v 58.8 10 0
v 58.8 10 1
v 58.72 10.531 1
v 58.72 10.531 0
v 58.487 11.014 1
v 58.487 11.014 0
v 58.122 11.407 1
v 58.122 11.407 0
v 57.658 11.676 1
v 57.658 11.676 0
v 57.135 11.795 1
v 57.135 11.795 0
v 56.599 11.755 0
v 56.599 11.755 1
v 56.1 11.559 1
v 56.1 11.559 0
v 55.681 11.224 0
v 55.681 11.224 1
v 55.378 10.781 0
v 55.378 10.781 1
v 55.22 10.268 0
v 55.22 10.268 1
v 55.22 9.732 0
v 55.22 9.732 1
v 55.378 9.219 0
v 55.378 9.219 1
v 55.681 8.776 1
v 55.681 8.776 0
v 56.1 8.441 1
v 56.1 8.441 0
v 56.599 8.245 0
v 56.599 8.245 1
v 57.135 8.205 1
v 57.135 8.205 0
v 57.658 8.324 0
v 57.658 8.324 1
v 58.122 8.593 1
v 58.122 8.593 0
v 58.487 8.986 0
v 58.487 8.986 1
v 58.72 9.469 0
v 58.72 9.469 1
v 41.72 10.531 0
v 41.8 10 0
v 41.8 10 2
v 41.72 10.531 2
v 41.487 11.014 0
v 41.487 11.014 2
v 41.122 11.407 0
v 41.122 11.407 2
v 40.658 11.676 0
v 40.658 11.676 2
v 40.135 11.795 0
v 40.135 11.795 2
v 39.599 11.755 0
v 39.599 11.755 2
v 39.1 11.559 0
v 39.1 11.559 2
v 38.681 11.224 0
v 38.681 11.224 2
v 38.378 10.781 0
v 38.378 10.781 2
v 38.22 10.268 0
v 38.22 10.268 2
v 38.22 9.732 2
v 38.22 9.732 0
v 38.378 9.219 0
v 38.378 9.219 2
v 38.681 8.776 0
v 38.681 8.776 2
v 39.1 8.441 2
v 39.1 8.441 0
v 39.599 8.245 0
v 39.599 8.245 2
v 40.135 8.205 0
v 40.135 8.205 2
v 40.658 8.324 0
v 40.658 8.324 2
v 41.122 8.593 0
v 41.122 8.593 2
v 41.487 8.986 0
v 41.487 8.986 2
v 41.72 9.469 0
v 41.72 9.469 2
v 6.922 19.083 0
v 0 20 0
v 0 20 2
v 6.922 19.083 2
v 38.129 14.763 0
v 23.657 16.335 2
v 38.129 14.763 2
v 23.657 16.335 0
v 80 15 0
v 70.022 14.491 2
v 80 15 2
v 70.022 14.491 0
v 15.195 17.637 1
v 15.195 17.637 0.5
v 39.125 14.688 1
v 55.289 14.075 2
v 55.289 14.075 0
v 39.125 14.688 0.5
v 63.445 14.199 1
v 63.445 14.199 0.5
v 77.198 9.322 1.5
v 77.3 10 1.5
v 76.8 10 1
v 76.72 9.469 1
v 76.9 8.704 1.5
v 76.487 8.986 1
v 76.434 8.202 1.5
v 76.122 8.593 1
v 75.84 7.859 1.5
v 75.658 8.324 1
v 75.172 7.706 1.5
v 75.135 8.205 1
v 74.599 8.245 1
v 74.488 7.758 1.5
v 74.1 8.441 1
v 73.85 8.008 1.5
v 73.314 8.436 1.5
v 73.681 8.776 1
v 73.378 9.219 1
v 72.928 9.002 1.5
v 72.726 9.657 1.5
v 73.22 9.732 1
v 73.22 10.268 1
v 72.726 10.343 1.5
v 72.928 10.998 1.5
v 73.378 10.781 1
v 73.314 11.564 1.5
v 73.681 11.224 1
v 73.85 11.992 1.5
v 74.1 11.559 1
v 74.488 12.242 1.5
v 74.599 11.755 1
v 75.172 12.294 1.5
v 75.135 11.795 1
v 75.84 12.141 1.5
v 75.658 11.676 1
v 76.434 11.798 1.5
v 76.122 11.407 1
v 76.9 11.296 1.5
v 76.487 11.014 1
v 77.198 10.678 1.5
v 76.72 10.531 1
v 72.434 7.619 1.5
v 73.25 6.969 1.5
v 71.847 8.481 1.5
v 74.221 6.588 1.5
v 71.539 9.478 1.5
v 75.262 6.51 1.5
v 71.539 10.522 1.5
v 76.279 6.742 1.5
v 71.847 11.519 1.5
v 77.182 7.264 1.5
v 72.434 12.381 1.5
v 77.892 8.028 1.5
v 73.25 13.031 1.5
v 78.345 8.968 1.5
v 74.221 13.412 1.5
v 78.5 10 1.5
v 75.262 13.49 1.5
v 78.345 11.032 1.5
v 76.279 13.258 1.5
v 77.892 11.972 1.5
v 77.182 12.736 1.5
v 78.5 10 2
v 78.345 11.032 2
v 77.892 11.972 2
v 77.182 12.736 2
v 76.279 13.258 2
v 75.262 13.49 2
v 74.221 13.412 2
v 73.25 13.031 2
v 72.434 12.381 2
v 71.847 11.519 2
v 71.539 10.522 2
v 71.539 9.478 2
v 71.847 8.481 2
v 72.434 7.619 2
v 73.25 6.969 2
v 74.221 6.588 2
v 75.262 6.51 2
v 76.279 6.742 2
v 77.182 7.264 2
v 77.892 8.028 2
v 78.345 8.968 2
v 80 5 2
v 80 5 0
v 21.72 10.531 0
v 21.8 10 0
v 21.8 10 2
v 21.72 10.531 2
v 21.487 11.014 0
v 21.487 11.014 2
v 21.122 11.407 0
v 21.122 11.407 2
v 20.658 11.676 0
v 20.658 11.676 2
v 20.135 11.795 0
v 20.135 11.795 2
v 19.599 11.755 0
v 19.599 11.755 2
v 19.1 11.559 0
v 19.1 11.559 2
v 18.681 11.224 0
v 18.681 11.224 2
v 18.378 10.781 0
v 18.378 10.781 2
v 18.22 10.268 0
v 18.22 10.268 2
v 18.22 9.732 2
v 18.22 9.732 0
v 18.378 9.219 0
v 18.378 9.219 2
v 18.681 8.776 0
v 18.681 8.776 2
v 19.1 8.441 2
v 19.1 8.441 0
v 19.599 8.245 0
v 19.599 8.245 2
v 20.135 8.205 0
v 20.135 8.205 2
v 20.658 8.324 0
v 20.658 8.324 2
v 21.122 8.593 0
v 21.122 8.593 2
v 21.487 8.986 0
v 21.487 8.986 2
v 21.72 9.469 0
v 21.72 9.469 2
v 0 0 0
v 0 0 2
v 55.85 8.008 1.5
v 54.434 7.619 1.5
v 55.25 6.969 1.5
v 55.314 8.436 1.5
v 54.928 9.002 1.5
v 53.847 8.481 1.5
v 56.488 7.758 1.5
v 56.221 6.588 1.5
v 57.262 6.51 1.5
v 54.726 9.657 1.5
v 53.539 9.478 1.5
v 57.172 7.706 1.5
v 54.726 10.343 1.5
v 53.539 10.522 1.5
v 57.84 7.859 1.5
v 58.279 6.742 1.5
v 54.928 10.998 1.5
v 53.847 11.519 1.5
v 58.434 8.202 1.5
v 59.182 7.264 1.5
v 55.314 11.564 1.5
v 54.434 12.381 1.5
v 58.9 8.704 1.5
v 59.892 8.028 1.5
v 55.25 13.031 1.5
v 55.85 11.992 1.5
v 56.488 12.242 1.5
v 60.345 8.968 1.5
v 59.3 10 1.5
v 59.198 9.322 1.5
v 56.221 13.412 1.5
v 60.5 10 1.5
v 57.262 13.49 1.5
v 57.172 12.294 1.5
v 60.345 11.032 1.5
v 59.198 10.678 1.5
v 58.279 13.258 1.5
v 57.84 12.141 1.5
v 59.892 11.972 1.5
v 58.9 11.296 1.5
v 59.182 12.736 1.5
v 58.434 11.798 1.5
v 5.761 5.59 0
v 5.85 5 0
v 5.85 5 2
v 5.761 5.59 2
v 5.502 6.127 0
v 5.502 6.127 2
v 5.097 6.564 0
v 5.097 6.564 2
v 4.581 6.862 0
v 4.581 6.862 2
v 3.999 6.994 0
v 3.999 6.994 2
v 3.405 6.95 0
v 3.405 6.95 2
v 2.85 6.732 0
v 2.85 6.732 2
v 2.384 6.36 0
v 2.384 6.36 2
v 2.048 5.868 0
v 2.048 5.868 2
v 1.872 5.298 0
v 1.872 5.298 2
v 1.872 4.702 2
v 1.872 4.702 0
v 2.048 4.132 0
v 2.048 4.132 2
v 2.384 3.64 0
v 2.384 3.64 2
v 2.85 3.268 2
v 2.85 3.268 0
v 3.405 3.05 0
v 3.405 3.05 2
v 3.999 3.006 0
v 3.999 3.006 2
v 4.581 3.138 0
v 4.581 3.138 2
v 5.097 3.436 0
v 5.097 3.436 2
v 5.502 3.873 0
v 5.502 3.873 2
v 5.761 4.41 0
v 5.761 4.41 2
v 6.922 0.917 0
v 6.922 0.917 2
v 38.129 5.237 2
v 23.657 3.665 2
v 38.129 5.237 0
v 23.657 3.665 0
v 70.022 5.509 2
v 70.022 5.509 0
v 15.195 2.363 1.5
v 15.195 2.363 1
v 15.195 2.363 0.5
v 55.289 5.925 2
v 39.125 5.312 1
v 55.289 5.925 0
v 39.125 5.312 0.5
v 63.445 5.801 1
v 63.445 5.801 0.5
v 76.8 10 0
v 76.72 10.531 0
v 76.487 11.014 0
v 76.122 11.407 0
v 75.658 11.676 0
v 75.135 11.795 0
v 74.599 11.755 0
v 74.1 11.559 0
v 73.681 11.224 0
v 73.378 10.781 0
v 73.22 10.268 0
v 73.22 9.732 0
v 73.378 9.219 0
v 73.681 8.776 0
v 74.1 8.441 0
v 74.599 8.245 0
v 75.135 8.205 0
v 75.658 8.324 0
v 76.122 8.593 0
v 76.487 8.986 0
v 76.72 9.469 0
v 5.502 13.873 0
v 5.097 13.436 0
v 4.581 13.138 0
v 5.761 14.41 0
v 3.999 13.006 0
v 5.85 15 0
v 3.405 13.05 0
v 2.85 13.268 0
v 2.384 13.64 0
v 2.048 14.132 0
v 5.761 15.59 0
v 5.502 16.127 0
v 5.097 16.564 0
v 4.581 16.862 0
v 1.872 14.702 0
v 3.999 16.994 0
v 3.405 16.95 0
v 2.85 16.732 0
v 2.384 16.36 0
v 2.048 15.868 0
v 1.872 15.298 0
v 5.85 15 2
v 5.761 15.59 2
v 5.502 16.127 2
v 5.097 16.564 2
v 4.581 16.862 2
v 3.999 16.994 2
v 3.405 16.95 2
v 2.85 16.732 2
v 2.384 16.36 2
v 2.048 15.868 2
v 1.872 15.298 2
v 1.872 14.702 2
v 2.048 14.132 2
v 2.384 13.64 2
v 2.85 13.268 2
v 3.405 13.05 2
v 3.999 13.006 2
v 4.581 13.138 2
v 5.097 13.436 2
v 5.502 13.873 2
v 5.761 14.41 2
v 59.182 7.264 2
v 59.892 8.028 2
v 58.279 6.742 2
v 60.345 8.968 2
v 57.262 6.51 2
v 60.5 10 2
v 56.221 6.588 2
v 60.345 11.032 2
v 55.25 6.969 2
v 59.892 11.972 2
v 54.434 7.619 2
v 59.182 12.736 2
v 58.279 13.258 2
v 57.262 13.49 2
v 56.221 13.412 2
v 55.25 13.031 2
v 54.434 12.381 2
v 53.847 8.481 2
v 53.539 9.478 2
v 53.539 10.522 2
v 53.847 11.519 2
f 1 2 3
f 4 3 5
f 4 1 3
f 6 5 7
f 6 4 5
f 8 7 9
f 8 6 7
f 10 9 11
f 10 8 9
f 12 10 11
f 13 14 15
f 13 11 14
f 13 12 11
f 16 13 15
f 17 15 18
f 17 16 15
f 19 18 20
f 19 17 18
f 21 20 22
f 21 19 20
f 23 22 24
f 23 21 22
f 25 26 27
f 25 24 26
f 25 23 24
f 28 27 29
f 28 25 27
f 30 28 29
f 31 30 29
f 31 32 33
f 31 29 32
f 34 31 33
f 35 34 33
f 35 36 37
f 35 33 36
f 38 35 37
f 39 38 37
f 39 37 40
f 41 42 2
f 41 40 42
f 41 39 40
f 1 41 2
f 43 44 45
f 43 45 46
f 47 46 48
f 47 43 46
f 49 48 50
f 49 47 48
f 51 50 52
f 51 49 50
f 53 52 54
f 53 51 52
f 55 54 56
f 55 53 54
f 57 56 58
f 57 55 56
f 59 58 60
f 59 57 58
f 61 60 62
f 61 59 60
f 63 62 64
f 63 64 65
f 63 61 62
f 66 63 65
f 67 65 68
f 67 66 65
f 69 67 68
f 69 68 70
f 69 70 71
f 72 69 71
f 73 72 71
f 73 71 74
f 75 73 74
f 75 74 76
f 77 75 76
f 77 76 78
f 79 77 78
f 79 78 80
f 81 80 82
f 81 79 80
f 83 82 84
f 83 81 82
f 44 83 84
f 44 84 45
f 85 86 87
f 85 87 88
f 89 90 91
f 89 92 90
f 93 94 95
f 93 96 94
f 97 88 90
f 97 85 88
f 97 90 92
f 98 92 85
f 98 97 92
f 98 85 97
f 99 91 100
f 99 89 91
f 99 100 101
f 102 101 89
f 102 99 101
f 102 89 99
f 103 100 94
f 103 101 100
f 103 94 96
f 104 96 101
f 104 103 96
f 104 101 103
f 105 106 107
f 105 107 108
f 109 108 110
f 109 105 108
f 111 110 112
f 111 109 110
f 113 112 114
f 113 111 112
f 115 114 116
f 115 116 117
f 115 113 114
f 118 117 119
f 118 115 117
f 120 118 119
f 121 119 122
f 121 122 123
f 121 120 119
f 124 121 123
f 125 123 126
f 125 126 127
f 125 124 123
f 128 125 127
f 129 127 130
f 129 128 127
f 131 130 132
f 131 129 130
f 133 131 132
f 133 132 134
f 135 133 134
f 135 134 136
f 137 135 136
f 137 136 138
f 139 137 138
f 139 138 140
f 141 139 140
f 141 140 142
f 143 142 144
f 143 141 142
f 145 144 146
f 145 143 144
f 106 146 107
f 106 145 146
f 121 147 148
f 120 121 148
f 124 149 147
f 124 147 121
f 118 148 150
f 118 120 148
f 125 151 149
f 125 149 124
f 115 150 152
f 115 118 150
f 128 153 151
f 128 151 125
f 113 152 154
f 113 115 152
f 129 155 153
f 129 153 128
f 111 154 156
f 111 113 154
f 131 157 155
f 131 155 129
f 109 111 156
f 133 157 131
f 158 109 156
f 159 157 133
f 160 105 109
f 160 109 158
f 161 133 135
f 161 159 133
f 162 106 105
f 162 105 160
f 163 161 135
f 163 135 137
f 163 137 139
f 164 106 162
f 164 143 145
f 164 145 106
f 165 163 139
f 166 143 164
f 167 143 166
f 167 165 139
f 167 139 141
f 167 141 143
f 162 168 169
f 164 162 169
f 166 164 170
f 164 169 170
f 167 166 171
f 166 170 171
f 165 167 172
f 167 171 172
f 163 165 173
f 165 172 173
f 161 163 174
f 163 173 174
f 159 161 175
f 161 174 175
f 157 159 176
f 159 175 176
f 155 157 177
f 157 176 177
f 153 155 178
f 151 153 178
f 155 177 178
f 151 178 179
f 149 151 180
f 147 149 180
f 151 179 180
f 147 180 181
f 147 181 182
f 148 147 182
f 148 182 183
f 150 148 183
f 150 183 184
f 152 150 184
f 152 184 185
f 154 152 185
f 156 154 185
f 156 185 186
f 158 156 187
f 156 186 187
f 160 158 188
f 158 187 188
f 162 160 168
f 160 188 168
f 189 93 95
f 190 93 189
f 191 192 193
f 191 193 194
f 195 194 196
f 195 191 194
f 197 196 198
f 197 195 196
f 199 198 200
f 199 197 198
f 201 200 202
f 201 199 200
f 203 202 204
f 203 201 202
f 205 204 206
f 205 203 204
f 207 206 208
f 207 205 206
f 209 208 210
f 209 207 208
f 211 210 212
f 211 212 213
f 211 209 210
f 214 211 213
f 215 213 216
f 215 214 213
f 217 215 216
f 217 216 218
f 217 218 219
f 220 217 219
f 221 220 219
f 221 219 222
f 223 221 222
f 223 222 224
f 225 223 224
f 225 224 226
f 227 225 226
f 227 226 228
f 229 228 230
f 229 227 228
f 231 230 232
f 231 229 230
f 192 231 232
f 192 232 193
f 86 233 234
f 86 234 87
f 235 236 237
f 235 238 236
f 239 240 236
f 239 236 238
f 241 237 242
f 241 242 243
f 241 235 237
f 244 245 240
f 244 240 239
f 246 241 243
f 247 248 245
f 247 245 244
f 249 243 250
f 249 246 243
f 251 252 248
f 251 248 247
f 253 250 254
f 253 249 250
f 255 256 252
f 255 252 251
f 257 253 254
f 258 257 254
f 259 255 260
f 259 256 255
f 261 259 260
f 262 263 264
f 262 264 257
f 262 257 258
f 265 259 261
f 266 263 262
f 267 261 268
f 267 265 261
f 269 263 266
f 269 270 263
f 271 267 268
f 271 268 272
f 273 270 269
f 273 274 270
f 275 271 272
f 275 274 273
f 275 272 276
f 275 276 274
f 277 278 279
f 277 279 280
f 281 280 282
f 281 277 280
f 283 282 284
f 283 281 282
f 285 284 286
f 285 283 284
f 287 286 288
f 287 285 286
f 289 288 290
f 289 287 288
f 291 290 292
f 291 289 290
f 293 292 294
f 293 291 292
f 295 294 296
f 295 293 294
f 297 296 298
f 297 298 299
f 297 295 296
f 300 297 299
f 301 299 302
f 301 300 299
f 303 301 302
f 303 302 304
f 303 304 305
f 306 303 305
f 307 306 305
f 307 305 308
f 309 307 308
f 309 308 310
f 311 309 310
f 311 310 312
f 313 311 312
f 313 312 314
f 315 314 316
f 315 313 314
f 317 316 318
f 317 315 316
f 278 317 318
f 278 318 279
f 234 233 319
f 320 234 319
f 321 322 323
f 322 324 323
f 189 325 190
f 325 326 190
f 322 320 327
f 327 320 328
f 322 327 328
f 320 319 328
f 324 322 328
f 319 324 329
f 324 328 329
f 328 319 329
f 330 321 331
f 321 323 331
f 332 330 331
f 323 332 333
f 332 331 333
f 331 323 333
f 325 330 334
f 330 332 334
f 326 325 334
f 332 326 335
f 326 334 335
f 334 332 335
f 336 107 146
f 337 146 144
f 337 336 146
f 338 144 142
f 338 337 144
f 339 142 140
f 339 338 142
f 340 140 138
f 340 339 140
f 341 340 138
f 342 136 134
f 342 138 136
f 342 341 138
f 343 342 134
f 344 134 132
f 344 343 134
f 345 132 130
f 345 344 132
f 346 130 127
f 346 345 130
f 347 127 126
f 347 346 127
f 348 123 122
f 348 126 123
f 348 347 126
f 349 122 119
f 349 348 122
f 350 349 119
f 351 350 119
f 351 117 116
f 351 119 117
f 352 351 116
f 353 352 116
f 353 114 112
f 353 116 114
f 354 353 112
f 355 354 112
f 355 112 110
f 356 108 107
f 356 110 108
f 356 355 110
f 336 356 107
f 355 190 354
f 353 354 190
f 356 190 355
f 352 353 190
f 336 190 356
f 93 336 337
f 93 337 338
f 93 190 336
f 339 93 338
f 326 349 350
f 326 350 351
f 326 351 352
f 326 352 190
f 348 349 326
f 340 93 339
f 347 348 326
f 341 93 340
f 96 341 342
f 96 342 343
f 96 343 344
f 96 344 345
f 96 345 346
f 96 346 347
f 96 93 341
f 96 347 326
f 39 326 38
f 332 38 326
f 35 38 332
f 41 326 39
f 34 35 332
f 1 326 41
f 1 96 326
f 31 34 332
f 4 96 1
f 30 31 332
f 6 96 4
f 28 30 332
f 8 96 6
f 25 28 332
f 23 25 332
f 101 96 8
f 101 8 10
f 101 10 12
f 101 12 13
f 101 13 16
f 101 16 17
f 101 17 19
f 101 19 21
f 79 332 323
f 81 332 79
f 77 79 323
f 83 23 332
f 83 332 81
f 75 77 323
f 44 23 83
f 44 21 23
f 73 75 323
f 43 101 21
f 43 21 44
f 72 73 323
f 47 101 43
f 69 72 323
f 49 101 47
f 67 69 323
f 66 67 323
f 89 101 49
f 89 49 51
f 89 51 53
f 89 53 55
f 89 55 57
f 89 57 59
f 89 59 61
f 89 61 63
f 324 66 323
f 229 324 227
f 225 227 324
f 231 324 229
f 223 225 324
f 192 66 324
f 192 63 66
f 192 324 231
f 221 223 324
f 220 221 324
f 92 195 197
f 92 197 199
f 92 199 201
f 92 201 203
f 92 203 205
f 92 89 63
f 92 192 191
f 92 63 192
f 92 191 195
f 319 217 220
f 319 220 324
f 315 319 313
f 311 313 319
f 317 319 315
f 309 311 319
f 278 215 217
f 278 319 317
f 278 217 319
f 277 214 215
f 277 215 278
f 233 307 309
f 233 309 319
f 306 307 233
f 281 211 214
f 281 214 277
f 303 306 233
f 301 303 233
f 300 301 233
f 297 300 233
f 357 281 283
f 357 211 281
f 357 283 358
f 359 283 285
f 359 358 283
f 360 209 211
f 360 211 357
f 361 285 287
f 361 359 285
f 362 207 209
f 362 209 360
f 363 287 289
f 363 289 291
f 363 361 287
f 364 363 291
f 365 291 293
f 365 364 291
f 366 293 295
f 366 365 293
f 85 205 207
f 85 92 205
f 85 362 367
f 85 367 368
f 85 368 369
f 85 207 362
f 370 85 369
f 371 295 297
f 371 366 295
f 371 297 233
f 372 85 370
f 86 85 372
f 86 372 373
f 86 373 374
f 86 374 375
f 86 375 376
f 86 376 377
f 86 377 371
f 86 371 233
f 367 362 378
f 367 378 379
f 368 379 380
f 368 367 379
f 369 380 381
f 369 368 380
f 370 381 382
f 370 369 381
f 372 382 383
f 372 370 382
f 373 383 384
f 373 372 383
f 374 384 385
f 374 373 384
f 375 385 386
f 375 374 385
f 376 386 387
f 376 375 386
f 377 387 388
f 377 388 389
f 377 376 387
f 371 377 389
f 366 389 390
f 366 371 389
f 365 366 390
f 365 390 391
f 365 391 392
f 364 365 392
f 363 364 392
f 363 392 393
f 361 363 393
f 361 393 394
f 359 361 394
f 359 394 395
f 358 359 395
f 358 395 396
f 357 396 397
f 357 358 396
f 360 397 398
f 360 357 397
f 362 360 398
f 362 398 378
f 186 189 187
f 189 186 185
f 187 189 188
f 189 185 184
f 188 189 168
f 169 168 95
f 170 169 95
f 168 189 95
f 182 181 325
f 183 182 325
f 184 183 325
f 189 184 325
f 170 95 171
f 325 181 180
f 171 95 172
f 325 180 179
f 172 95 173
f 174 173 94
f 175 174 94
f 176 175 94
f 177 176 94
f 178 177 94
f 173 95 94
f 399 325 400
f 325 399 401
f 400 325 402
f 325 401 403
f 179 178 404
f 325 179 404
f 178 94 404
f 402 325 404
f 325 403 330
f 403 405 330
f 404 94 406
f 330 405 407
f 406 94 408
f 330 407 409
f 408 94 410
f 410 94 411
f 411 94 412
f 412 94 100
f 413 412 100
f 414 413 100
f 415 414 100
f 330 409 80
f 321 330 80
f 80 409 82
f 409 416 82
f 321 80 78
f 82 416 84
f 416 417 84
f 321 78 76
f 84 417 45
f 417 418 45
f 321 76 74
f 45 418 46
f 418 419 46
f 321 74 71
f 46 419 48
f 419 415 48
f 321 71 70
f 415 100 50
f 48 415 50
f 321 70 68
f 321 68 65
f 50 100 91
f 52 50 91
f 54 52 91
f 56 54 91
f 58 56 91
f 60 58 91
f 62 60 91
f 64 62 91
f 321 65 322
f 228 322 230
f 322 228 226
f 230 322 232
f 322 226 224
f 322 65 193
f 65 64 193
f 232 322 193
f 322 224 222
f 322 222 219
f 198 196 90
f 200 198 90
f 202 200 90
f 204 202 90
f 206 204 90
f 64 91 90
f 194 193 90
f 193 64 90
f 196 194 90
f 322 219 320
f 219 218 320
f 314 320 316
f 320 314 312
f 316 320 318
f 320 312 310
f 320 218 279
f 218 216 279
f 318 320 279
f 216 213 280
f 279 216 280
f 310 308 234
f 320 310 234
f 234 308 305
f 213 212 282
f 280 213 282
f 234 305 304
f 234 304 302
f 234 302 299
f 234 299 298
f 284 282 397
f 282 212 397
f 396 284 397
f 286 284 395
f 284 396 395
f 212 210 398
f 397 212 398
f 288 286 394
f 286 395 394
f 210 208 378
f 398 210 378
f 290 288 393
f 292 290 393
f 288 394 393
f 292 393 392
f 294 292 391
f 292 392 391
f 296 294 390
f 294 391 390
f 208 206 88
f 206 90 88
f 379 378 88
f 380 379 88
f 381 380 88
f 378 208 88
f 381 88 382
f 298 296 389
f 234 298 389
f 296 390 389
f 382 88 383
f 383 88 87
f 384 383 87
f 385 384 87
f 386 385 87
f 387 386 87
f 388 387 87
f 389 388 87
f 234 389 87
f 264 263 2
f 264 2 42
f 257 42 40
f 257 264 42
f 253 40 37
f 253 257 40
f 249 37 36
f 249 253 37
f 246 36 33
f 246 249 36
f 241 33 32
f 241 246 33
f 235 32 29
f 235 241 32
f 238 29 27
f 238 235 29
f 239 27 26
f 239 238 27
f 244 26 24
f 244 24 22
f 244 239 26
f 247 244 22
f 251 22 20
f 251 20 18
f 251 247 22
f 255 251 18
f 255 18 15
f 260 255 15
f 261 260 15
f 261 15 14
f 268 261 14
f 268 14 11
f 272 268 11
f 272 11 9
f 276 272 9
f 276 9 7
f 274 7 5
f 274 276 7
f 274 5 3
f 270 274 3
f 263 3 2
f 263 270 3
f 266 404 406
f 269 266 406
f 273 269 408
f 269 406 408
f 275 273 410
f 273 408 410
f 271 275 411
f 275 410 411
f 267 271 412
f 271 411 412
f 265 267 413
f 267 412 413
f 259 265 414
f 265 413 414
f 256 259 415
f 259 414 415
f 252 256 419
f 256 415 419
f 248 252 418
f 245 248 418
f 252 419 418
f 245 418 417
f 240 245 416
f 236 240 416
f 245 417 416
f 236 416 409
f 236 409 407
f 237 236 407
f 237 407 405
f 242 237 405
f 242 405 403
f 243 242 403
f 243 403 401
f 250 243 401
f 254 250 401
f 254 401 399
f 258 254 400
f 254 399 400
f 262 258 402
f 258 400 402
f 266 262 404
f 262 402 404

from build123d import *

# Parameters (mm, degrees)
ESQUISSE1_R             = 2
ESQUISSE1_R_2           = 1.8
BOSS_EXTRU_1_DEPTH      = 2
ESQUISSE3_R             = 3.5
ENL_V_MAT_EXTRU_1_DEPTH = 0.5
CHANFREIN1_SIZE         = 0.5


with BuildPart() as part:
    # Esquisse1 → Boss.-Extru.1 (new body)
    with BuildSketch(Plane.XY):
        with BuildLine():
            Line((0, 0), (0, 20))
            add(Edge.make_bspline(
                [(0, 20), (8, 20), (39, 10), (70, 15), (80, 15)],
                knots=[0, 0, 0, 0, 0, 1, 1, 1, 1, 1], degree=4))
            Line((80, 15), (80, 5))
            add(Edge.make_bspline(
                [(0, 0), (8, 0), (39, 10), (70, 5), (80, 5)],
                knots=[0, 0, 0, 0, 0, 1, 1, 1, 1, 1], degree=4))
        make_face()
        with Locations((3.85, 15)):
            Circle(ESQUISSE1_R, mode=Mode.SUBTRACT)
        with Locations((3.85, 5)):
            Circle(ESQUISSE1_R, mode=Mode.SUBTRACT)
        with Locations((57, 10)):
            Circle(ESQUISSE1_R_2, mode=Mode.SUBTRACT)
        with Locations((75, 10)):
            Circle(ESQUISSE1_R_2, mode=Mode.SUBTRACT)
        with Locations((20, 10)):
            Circle(ESQUISSE1_R_2, mode=Mode.SUBTRACT)
        with Locations((40, 10)):
            Circle(ESQUISSE1_R_2, mode=Mode.SUBTRACT)
    extrude(amount=BOSS_EXTRU_1_DEPTH)

    # Esquisse3 → Enlèv. mat.-Extru.1 (cut)
    with BuildSketch(Plane.XY.offset(2)):
        with Locations((57, 10)):
            Circle(ESQUISSE3_R)
        with Locations((75, 10)):
            Circle(ESQUISSE3_R)
    extrude(amount=-ENL_V_MAT_EXTRU_1_DEPTH, mode=Mode.SUBTRACT)

    # Chanfrein1
    chanfrein1_edges = [part.edges().sort_by_distance(p)[0] for p in [
        (55.2, 10, 1.5),
        (73.2, 10, 1.5),
    ]]
    chamfer(chanfrein1_edges, length=CHANFREIN1_SIZE)


solid = part.part
